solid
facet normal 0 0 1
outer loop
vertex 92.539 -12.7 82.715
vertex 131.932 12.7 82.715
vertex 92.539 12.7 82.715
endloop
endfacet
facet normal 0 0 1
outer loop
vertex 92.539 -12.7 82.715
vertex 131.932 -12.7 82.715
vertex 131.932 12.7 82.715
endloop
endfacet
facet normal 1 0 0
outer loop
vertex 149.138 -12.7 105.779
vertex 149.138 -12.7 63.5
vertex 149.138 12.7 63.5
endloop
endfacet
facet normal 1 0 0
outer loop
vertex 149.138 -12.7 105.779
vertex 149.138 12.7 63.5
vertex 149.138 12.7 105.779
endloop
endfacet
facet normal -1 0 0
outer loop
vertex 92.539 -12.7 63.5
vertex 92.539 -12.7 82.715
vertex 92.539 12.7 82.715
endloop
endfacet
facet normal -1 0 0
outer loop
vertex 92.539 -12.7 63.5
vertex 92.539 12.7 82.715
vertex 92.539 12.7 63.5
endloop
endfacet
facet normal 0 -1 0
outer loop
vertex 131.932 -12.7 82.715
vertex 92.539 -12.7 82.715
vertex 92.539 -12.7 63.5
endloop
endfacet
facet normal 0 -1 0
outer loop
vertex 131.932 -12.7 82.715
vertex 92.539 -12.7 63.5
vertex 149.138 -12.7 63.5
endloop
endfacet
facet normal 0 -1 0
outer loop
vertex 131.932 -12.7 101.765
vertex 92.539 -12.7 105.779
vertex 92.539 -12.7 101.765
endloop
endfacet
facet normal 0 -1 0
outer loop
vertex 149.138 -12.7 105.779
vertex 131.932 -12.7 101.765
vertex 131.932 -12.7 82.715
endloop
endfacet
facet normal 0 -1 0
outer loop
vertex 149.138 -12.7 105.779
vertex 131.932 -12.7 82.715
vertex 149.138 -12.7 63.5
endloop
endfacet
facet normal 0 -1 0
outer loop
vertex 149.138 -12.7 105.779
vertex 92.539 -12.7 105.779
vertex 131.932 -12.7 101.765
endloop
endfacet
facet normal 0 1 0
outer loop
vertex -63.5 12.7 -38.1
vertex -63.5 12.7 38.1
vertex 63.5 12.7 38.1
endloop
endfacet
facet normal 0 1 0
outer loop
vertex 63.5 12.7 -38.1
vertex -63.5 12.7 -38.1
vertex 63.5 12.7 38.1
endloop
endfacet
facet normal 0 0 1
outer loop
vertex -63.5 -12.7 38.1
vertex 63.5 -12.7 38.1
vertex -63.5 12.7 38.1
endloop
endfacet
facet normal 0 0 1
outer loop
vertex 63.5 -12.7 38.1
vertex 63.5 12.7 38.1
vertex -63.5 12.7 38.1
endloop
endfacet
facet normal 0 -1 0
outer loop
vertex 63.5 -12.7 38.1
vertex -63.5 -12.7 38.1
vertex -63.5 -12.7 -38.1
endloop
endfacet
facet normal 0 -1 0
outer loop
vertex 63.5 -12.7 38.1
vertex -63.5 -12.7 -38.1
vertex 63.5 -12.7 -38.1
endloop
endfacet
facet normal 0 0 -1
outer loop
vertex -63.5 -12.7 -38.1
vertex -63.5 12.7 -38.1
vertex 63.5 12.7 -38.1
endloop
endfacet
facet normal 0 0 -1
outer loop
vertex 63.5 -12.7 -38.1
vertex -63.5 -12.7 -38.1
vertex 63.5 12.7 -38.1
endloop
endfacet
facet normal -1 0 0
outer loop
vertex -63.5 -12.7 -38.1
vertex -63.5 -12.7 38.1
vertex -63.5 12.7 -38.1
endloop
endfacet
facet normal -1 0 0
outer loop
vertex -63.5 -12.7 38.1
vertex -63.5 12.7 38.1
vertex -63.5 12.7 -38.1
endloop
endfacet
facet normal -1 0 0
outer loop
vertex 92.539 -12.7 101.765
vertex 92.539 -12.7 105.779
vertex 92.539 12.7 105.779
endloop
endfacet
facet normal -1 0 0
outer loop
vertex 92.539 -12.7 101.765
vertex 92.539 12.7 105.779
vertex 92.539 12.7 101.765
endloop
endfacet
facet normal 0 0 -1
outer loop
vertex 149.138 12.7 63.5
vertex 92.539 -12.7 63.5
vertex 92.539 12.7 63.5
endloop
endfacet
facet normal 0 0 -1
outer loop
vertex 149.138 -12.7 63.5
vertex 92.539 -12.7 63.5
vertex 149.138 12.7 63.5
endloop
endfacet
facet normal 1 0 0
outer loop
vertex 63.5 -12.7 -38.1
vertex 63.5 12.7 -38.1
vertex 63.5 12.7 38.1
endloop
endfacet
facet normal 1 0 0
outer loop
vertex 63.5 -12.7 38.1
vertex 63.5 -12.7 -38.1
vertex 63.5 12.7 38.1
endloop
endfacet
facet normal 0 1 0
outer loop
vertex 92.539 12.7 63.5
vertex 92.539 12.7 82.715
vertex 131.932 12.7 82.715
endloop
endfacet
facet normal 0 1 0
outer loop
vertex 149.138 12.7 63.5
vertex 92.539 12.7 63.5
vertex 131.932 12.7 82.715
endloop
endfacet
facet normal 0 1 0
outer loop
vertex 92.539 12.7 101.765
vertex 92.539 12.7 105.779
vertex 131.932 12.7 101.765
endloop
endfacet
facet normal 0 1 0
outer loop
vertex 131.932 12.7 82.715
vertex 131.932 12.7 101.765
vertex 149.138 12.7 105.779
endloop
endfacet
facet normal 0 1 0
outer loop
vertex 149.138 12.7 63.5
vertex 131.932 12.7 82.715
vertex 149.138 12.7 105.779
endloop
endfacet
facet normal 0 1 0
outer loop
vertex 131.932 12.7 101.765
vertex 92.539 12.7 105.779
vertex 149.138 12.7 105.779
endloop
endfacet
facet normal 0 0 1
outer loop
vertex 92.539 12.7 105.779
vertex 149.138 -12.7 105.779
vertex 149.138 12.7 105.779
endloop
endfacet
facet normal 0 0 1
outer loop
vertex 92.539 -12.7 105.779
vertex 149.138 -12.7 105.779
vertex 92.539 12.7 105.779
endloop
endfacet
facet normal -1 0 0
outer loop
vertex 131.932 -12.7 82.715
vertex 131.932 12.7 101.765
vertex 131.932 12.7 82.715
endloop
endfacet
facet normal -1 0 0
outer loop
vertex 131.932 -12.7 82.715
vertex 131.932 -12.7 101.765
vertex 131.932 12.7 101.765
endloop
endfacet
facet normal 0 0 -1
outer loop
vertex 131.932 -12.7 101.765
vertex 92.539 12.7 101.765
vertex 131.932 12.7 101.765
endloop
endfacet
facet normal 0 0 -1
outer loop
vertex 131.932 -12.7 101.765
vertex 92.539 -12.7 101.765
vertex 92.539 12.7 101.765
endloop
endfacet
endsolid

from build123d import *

# Parameters (mm, degrees)
F1_DEPTH = 12.7


with BuildPart() as f1:
    # F0 (on Front) → F1 (new body, symmetric)
    with BuildSketch(Plane.XZ):
        Polygon((63.5, -38.1), (63.5, 38.1), (29.485926, 38.1), (10.435926, 38.1), (-63.5, 38.1), (-63.5, -38.1), align=None)
        Polygon((131.932074, 82.714616), (92.539109, 82.714616), (92.539109, 63.5), (149.138249, 63.5), (149.138249, 105.778916), (92.539109, 105.778916), (92.539109, 101.764616), (131.932074, 101.764616), align=None)
    extrude(amount=F1_DEPTH, both=True)


solid = f1.part
